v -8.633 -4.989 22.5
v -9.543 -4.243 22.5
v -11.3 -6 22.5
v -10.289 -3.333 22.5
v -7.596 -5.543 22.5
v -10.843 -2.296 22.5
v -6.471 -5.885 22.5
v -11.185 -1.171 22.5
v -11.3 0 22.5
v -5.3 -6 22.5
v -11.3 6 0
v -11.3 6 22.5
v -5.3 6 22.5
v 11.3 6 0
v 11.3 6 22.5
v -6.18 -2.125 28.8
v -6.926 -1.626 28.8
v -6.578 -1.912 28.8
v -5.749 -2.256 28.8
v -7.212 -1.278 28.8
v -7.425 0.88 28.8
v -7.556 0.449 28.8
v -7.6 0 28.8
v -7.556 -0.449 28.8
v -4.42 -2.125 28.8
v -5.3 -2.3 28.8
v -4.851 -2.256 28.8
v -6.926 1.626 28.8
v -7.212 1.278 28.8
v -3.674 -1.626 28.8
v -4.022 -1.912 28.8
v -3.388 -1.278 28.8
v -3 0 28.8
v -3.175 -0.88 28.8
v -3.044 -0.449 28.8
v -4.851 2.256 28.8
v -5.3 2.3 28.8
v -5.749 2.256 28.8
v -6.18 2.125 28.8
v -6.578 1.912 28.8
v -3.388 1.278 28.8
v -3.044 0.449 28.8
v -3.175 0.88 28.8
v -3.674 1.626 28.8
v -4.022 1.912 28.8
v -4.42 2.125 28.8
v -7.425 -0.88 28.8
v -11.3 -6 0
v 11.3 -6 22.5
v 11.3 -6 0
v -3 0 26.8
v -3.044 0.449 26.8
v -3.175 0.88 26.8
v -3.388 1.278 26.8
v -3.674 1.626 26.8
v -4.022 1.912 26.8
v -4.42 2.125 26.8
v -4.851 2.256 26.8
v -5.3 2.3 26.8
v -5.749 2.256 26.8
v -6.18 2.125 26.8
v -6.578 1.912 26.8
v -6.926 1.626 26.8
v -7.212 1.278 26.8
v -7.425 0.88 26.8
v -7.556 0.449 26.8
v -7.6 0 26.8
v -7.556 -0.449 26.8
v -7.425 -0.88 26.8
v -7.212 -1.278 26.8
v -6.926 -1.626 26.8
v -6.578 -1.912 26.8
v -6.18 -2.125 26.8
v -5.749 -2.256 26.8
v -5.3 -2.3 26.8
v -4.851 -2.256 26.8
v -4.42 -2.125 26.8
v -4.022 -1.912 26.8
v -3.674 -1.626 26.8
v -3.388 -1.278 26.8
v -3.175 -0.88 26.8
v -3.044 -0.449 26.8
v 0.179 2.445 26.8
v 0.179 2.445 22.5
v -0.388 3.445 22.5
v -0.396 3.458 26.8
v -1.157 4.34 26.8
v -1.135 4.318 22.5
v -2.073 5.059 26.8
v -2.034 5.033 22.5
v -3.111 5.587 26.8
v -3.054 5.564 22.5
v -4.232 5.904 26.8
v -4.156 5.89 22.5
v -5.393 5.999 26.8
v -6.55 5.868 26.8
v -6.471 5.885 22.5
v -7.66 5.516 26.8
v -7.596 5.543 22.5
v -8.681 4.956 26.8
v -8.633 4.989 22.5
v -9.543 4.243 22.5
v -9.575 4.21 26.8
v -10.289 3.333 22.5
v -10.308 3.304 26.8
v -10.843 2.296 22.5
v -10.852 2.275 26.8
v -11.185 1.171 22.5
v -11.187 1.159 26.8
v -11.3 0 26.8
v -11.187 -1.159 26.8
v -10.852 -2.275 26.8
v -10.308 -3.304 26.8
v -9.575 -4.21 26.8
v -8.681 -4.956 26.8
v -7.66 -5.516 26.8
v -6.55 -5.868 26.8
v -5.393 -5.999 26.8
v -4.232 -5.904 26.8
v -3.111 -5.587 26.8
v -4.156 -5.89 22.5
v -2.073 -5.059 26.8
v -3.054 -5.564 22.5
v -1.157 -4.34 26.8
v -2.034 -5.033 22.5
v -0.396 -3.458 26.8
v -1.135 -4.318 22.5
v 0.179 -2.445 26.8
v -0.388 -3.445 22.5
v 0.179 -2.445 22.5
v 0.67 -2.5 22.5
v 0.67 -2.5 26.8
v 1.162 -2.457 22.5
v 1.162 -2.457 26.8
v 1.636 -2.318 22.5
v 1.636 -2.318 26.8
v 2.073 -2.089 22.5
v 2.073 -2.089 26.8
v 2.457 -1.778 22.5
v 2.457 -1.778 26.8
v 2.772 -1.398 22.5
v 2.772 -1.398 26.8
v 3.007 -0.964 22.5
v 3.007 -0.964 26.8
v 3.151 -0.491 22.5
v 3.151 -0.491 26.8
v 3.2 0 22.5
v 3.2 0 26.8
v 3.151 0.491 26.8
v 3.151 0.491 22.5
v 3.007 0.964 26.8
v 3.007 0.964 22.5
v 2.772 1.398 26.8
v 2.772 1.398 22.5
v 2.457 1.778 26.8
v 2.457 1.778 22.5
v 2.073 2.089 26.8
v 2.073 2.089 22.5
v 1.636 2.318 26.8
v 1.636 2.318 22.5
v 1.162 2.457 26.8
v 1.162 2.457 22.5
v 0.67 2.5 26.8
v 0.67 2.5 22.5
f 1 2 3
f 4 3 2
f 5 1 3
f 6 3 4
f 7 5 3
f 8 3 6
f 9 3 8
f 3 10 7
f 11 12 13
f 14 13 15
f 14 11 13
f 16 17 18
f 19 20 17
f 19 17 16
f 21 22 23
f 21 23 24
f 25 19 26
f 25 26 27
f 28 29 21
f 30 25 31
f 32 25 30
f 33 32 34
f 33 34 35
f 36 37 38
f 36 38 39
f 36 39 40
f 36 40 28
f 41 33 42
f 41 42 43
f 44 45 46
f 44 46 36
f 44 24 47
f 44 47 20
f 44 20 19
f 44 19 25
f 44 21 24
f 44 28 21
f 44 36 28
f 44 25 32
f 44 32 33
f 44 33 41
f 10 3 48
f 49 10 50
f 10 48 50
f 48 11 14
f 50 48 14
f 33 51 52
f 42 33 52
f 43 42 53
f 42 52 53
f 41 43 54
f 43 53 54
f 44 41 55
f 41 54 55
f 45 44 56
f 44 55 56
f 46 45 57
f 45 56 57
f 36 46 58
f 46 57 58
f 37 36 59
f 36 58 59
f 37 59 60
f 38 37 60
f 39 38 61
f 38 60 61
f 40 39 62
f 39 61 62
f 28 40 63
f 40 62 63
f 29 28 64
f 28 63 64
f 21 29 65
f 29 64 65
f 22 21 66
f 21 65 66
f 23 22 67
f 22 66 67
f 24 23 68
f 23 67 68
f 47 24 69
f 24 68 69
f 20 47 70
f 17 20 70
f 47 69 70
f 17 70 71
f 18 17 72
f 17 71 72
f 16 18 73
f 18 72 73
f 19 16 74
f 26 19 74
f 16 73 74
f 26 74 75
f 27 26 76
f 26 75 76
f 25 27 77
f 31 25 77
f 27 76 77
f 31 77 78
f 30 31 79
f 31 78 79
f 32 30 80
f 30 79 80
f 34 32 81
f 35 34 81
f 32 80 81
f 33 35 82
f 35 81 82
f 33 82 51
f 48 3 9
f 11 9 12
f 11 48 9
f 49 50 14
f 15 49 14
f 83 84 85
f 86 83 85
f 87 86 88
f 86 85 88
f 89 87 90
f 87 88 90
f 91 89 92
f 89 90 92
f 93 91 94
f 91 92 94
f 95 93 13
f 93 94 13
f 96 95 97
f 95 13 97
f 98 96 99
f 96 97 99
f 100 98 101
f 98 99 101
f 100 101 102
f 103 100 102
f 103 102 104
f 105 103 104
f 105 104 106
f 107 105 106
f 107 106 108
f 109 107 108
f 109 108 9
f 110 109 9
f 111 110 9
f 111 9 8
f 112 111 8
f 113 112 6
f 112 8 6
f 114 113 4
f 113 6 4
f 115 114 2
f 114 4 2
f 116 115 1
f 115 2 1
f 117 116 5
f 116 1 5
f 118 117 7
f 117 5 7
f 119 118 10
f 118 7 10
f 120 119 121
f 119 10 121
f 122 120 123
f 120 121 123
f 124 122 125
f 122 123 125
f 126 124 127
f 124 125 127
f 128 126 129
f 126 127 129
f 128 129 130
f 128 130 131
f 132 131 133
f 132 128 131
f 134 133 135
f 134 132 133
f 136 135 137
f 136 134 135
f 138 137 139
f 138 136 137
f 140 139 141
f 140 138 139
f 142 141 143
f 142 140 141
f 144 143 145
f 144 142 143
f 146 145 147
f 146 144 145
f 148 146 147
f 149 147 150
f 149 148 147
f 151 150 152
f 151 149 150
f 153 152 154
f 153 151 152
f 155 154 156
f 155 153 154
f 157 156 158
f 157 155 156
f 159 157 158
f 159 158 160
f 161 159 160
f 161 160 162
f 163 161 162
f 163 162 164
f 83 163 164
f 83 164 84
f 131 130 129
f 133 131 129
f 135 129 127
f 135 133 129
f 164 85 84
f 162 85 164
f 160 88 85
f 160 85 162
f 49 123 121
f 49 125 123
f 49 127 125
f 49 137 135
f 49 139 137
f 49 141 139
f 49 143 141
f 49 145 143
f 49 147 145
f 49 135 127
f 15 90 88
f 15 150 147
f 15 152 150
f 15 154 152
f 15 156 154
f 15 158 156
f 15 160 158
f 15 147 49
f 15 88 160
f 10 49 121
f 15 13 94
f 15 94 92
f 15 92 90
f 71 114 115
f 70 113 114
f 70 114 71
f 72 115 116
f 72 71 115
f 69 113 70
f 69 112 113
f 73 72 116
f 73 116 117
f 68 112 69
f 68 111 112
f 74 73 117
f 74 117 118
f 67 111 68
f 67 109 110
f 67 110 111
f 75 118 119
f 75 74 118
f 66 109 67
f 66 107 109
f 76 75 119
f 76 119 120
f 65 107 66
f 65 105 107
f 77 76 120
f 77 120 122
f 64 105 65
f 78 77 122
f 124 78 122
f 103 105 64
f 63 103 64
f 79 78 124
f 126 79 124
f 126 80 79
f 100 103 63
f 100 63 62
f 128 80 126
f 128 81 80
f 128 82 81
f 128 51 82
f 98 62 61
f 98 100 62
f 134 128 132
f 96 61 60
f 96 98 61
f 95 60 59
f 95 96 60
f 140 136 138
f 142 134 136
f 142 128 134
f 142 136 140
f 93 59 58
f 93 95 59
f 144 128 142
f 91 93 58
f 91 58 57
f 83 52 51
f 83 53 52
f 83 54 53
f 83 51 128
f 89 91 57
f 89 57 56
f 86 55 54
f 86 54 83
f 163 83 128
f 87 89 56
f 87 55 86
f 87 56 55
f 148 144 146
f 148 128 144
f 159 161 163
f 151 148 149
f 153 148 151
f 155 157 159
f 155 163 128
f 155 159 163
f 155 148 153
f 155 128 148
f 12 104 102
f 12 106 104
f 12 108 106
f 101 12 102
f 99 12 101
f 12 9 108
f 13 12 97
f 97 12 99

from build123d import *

# Parameters (mm, degrees)
F0_W     = 22.6
F0_H     = 12
F1_DEPTH = 22.5
F2_R     = 6
F3_DEPTH = 4.3
F4_R     = 2.3
F5_DEPTH = 2
F6_R     = 2.5
F7_DEPTH = 5


with BuildPart() as f1:
    # F0 (on Top) → F1 (new body)
    with BuildSketch(Plane.XY):
        Rectangle(F0_W, F0_H)
    extrude(amount=F1_DEPTH)

    # F2 (on face) → F3 (join)
    with BuildSketch(Plane.XY.offset(22.5)):
        with Locations((-5.3, 0)):
            Circle(F2_R)
    extrude(amount=F3_DEPTH)

    # F4 (on face) → F5 (join)
    with BuildSketch(Plane.XY.offset(26.8)):
        with Locations((-5.3, 0)):
            Circle(F4_R)
    extrude(amount=F5_DEPTH)

    # F6 (on face) → F7 (join)
    with BuildSketch(Plane.XY.offset(26.8)):
        with Locations((0.7, 0)):
            Circle(F6_R)
    extrude(amount=-F7_DEPTH)


solid = f1.part
